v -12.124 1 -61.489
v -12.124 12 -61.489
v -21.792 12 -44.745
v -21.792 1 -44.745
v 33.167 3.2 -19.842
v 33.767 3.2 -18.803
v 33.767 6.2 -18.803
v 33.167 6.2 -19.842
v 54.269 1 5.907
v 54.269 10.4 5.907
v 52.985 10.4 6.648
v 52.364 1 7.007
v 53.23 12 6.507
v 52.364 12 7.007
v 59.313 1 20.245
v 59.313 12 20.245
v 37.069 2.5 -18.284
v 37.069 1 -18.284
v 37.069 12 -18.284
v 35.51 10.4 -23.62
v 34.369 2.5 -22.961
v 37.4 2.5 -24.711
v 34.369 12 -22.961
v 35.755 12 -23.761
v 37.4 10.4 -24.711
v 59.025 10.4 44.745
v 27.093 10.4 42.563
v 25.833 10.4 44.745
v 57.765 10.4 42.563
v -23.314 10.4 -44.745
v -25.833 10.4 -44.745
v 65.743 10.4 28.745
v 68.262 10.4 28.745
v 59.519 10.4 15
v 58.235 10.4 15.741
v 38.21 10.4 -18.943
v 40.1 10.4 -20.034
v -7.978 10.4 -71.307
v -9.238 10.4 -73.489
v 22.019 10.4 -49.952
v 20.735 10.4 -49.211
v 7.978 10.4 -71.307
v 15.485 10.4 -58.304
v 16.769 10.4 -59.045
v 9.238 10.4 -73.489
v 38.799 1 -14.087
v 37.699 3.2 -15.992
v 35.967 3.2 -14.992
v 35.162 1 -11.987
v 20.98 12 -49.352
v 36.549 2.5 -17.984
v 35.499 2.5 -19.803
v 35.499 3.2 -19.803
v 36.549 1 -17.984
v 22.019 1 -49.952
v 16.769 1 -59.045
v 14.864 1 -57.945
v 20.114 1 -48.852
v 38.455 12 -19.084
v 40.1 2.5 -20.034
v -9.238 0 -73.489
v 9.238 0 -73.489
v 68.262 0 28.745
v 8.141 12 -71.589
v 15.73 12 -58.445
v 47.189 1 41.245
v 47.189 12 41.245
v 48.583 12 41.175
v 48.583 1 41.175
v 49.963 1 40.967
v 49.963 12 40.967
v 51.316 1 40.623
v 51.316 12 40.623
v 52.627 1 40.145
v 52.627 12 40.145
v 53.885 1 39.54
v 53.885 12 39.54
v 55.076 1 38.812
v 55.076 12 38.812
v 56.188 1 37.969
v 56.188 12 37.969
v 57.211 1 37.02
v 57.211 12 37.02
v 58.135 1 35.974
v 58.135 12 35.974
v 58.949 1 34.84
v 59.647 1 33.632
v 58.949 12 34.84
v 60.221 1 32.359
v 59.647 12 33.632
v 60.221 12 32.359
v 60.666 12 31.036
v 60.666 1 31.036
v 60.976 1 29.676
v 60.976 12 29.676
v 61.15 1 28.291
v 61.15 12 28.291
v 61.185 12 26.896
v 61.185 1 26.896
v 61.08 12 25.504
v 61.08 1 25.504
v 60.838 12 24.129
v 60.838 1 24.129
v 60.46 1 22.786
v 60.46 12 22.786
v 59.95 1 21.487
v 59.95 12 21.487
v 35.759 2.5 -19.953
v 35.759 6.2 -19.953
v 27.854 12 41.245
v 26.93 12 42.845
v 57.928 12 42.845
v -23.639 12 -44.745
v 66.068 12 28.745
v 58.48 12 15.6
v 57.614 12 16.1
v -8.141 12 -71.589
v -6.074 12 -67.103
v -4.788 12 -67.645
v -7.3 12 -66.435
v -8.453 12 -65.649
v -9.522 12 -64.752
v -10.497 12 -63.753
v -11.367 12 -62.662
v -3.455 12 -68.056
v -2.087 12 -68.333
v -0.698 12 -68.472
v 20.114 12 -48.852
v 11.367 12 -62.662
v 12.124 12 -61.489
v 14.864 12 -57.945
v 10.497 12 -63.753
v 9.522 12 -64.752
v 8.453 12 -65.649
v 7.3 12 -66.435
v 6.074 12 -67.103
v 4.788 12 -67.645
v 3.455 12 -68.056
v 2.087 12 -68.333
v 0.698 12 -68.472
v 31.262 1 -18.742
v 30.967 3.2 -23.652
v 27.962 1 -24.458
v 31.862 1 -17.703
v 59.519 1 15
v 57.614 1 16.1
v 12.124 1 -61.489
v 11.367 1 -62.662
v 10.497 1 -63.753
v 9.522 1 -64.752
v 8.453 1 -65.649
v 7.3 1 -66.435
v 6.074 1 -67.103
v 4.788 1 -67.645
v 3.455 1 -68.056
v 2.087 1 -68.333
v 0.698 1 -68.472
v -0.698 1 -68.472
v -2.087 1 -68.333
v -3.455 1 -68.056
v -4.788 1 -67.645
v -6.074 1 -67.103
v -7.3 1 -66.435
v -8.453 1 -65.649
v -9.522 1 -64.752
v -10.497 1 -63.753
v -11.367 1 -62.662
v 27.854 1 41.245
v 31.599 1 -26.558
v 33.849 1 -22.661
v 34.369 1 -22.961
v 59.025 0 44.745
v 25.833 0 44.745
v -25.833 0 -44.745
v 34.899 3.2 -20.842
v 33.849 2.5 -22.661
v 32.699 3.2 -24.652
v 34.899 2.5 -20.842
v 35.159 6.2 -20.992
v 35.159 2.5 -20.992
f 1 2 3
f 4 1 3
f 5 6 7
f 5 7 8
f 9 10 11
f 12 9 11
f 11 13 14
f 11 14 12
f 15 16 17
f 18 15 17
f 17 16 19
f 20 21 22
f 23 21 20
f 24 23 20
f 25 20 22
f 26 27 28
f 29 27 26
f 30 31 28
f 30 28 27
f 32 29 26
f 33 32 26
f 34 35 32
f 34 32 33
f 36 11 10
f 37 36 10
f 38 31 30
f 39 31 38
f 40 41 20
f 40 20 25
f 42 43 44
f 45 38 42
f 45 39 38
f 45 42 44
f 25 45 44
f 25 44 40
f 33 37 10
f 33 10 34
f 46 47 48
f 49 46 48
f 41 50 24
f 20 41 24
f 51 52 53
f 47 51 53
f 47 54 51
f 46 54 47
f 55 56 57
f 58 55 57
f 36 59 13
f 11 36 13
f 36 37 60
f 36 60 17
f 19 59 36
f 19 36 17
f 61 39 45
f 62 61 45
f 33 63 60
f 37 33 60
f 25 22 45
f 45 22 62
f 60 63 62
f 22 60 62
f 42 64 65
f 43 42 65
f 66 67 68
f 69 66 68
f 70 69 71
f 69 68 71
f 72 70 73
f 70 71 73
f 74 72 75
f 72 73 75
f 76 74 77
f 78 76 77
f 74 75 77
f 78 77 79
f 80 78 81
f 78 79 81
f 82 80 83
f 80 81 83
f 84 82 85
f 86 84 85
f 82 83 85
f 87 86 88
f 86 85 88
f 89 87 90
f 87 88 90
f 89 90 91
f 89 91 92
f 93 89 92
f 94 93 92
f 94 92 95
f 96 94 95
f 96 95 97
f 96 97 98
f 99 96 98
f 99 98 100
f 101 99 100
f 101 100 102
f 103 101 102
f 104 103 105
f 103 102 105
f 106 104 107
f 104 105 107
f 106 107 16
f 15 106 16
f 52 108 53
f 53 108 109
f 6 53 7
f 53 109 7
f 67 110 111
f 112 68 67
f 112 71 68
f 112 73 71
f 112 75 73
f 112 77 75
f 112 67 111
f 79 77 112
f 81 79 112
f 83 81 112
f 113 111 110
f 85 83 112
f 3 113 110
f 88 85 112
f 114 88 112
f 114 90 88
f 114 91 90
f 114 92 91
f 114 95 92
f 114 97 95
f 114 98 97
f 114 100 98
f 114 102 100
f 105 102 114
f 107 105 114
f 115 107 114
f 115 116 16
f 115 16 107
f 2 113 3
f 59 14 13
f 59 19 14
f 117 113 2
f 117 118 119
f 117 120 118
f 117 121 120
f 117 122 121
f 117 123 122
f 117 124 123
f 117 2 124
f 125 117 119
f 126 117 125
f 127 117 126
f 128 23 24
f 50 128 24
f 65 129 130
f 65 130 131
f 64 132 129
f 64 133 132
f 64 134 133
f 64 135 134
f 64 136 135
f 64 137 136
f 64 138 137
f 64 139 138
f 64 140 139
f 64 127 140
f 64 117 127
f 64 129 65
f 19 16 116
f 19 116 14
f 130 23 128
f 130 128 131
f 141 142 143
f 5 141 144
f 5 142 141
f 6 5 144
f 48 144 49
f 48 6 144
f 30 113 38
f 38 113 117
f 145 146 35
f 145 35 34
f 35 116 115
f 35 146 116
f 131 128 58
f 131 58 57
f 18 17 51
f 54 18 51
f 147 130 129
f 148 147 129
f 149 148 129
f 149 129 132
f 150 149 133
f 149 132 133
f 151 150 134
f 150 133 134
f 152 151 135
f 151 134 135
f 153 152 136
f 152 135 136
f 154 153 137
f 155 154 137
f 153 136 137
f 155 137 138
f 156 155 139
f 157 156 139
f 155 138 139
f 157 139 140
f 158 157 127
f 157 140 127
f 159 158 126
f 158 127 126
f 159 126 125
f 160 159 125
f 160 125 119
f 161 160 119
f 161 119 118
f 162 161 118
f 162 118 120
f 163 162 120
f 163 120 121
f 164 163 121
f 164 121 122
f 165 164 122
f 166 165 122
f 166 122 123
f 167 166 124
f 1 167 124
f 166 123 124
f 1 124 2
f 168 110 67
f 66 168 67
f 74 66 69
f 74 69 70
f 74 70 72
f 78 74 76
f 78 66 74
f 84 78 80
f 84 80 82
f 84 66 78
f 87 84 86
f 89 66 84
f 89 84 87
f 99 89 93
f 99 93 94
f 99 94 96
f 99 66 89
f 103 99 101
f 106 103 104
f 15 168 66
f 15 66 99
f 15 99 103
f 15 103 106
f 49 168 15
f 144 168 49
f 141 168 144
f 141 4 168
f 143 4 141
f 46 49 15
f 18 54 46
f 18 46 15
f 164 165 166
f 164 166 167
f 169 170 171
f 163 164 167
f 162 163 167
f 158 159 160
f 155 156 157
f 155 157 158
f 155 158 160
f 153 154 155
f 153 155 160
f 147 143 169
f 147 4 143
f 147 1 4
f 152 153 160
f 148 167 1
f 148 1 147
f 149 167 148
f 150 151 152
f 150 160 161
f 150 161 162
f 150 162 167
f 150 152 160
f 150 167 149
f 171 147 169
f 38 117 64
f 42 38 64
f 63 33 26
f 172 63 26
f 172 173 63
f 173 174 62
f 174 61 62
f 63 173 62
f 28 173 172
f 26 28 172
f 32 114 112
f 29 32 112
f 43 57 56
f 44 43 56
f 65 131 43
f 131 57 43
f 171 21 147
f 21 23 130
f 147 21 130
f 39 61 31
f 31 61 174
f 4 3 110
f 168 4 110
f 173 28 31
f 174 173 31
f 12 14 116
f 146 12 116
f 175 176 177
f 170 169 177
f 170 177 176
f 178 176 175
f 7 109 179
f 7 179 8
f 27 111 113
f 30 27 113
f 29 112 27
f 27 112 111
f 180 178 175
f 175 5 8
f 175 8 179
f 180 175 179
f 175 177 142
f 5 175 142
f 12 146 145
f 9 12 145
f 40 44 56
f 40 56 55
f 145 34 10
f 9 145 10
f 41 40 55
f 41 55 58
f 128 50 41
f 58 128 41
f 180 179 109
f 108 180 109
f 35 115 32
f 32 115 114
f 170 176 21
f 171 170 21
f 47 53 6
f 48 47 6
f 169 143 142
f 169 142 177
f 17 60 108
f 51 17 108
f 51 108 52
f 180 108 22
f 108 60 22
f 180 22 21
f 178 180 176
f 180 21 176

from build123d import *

# Parameters (mm, degrees)
BOSS_EXTRU_1_DEPTH              = 12
ENL_V_MAT_EXTRU_1_DEPTH         = 119.989845505
ENL_V_MAT_EXTRU_2_DEPTH         = 11
ENL_V_MAT_EXTRU_3_DEPTH         = 9.5
BOSS_EXTRU_6_DEPTH              = 2.2
BOSS_EXTRU_8_DEPTH              = 1.5
BOSS_EXTRU_7_DEPTH              = 3
BOSS_EXTRU_7_DIRECTION_2_REACH  = 102.687
CHANFREIN3_SIZE                 = 2.2
ENL_V_DE_MAT_EXTRU_MINCE1_DEPTH = 1.6
ENL_V_DE_MAT_EXTRU_MINCE1_DRAFT = 10
ENL_V_MAT_EXTRU_10_DEPTH        = 11


with BuildPart() as part:
    # Esquisse1 → Boss.-Extru.1 (new body)
    with BuildSketch(Plane(origin=(0, 0, 0), x_dir=(1, 0, 0), z_dir=(0, 1, 0))):
        Polygon((-77.5, -44.744645862), (77.5, -44.744645862), (0, 89.489291724), align=None)
    extrude(amount=BOSS_EXTRU_1_DEPTH)

    # Esquisse2 → Enlèv. mat.-Extru.1 (cut, through all)
    with BuildSketch(Plane(origin=(0, 12, 0), x_dir=(1, 0, 0), z_dir=(0, 1, 0))):
        Polygon((-9.237604307, 73.489291724), (9.237604307, 73.489291724), (0, 89.489291724), align=None)
        Polygon((77.5, -44.744645862), (68.262395693, -28.744645862), (59.024791386, -44.744645862), align=None)
        Polygon((-77.5, -44.744645862), (25.833333333, -44.744645862), (-25.833333333, 44.744645862), align=None)
    extrude(amount=-ENL_V_MAT_EXTRU_1_DEPTH, mode=Mode.SUBTRACT)

    # Esquisse3 → Enlèv. mat.-Extru.2 (cut)
    with BuildSketch(Plane(origin=(0, 12, 0), x_dir=(1, 0, 0), z_dir=(0, 1, 0))):
        with BuildLine():
            Line((59.313466521, -20.244645862), (12.124355653, 61.489291724))
            ThreePointArc((12.124355653, 61.489291724), (0, 68.489291724), (-12.124355653, 61.489291724))
            Line((-12.124355653, 61.489291724), (-21.791881449, 44.744645862))
            Line((-21.791881449, 44.744645862), (27.854059275, -41.244645862))
            Line((27.854059275, -41.244645862), (47.189110868, -41.244645862))
            ThreePointArc((47.189110868, -41.244645862), (59.313466521, -34.244645862), (59.313466521, -20.244645862))
        make_face()
    extrude(amount=-ENL_V_MAT_EXTRU_2_DEPTH, mode=Mode.SUBTRACT)

    # Esquisse4 → Enlèv. mat.-Extru.3 (cut)
    with BuildSketch(Plane(origin=(0, 12, 0), x_dir=(1, 0, 0), z_dir=(0, 1, 0))):
        Polygon((37.068911087, 18.284054341), (34.368911087, 22.960591521), (37.4, 24.710591521), (40.1, 20.034054341), align=None)
    extrude(amount=-ENL_V_MAT_EXTRU_3_DEPTH, mode=Mode.SUBTRACT)

    # Esquisse14 → Boss.-Extru.6 (add)
    with BuildSketch(Plane(origin=(0, 1, 0), x_dir=(1, 0, 0), z_dir=(0, 1, 0))):
        Polygon((32.699295844, 24.65244995), (37.699295844, 15.992195912), (35.967245037, 14.992195912), (30.967245037, 23.65244995), align=None)
    extrude(amount=BOSS_EXTRU_6_DEPTH)

    # Esquisse19 → Boss.-Extru.8 (add)
    with BuildSketch(Plane(origin=(0, 2.5, 0), x_dir=(1, 0, 0), z_dir=(0, 1, 0))):
        Polygon((34.368911087, 22.960591521), (37.068911087, 18.284054341), (36.549295844, 17.984054341), (33.849295844, 22.660591521), align=None)
    extrude(amount=-BOSS_EXTRU_8_DEPTH)

    # Esquisse15 → Boss.-Extru.7 (add)
    with BuildSketch(Plane(origin=(0, 3.2, 0), x_dir=(1, 0, 0), z_dir=(0, 1, 0))):
        Polygon((35.159103466, 20.991938173), (35.759103466, 19.952707689), (33.767245037, 18.802707689), (33.167245037, 19.841938173), align=None)
    extrude(amount=BOSS_EXTRU_7_DEPTH)

    # Boss.-Extru.7 direction 2: up to this face of the body (flat: up to its plane)
    boss_extru_7_direction_2_end = Plane(part.part.faces().sort_by_distance((19.594473703, 1, -11.312874667))[0])
    # Esquisse15 → Boss.-Extru.7 direction 2 (add, up to the picked face)
    with BuildSketch(Plane(origin=(0, 3.2, 0), x_dir=(1, 0, 0), z_dir=(0, 1, 0)), mode=Mode.PRIVATE) as boss_extru_7_direction_2_sk1:
        Polygon((35.159103466, 20.991938173), (35.759103466, 19.952707689), (33.767245037, 18.802707689), (33.167245037, 19.841938173), align=None)
    boss_extru_7_direction_2_tool1 = split(extrude(boss_extru_7_direction_2_sk1.sketch, amount=-BOSS_EXTRU_7_DIRECTION_2_REACH, mode=Mode.PRIVATE), bisect_by=boss_extru_7_direction_2_end, keep=Keep.BOTH, mode=Mode.PRIVATE)
    add(boss_extru_7_direction_2_tool1.solids().sort_by(Axis((34.463174, 3.2, -19.897323), (0, -1, 0)))[0])

    # Chanfrein3
    chanfrein3_edges = [part.edges().sort_by_distance(p)[0] for p in [
        (33.467245037, 1, -19.322322931),
        (36.833270441, 1, -15.492195912),
        (31.833270441, 1, -24.15244995),
    ]]
    chamfer(chanfrein3_edges, length=CHANFREIN3_SIZE - 0.0001)  # a hair under: the kernel refuses the full size


with BuildPart() as enl_v_de_mat_extru_mince1_tool:
    # Esquisse17 → Enlèv. de mat.-Extru.-Mince1 (with draft: the straight prism first)
    with BuildSketch(Plane(origin=(0, 12, 0), x_dir=(1, 0, 0), z_dir=(0, 1, 0))):
        Polygon((37.4, 24.710591521), (9.237604307, 73.489291724), (-9.237604307, 73.489291724), (-25.833333333, 44.744645862), (25.833333333, -44.744645862), (59.024791386, -44.744645862), (68.262395693, -28.744645862), (40.1, 20.034054341), (38.454551733, 19.084054341), (66.06846467, -28.744645862), (57.927825874, -42.844645862), (26.930298845, -42.844645862), (-23.63940231, 44.744645862), (-8.140638796, 71.589291724), (8.140638796, 71.589291724), (35.754551733, 23.760591521), align=None)
    extrude(amount=-ENL_V_DE_MAT_EXTRU_MINCE1_DEPTH)
    # Enlèv. de mat.-Extru.-Mince1: the draft: its side faces are tilted about the plane it starts from
    enl_v_de_mat_extru_mince1_sides = [enl_v_de_mat_extru_mince1_tool.faces().sort_by_distance(p)[0] for p in [
        (23.318802154, 11.2, -49.099941623),
        (0, 11.2, -73.489291724),
        (-17.53546882, 11.2, -59.116968793),
        (0, 11.2, 0),
        (42.42906236, 11.2, 44.744645862),
        (63.643593539, 11.2, 36.744645862),
        (54.181197846, 11.2, 4.355295761),
        (39.277275866, 11.2, -19.559054341),
        (52.261508201, 11.2, 4.830295761),
        (61.998145272, 11.2, 35.794645862),
        (42.42906236, 11.2, 42.844645862),
        (1.645448267, 11.2, -0.95),
        (-15.890020553, 11.2, -58.166968793),
        (0, 11.2, -71.589291724),
        (21.947595264, 11.2, -47.674941623),
        (36.577275866, 11.2, -24.235591521),
    ]]
    draft(enl_v_de_mat_extru_mince1_sides, Plane(origin=(0, 12, 0), x_dir=(1, 0, 0), z_dir=(0, 1, 0)), ENL_V_DE_MAT_EXTRU_MINCE1_DRAFT)


with BuildPart() as part_1:
    add(part.part)

    # Enlèv. de mat.-Extru.-Mince1: cut by enl_v_de_mat_extru_mince1_tool
    add(enl_v_de_mat_extru_mince1_tool.part, mode=Mode.SUBTRACT)

    # Esquisse18 → Enlèv. mat.-Extru.10 (cut)
    with BuildSketch(Plane(origin=(0, 12, 0), x_dir=(1, 0, 0), z_dir=(0, 1, 0))):
        Polygon((57.613526329, -16.100263081), (59.518782217, -15.000263081), (54.268782217, -5.906996341), (52.363526329, -7.006996341), align=None)
        Polygon((20.113526329, 48.851642203), (14.863526329, 57.944908943), (16.768782217, 59.044908943), (22.018782217, 49.951642203), align=None)
    extrude(amount=-ENL_V_MAT_EXTRU_10_DEPTH, mode=Mode.SUBTRACT)


solid = part_1.part
